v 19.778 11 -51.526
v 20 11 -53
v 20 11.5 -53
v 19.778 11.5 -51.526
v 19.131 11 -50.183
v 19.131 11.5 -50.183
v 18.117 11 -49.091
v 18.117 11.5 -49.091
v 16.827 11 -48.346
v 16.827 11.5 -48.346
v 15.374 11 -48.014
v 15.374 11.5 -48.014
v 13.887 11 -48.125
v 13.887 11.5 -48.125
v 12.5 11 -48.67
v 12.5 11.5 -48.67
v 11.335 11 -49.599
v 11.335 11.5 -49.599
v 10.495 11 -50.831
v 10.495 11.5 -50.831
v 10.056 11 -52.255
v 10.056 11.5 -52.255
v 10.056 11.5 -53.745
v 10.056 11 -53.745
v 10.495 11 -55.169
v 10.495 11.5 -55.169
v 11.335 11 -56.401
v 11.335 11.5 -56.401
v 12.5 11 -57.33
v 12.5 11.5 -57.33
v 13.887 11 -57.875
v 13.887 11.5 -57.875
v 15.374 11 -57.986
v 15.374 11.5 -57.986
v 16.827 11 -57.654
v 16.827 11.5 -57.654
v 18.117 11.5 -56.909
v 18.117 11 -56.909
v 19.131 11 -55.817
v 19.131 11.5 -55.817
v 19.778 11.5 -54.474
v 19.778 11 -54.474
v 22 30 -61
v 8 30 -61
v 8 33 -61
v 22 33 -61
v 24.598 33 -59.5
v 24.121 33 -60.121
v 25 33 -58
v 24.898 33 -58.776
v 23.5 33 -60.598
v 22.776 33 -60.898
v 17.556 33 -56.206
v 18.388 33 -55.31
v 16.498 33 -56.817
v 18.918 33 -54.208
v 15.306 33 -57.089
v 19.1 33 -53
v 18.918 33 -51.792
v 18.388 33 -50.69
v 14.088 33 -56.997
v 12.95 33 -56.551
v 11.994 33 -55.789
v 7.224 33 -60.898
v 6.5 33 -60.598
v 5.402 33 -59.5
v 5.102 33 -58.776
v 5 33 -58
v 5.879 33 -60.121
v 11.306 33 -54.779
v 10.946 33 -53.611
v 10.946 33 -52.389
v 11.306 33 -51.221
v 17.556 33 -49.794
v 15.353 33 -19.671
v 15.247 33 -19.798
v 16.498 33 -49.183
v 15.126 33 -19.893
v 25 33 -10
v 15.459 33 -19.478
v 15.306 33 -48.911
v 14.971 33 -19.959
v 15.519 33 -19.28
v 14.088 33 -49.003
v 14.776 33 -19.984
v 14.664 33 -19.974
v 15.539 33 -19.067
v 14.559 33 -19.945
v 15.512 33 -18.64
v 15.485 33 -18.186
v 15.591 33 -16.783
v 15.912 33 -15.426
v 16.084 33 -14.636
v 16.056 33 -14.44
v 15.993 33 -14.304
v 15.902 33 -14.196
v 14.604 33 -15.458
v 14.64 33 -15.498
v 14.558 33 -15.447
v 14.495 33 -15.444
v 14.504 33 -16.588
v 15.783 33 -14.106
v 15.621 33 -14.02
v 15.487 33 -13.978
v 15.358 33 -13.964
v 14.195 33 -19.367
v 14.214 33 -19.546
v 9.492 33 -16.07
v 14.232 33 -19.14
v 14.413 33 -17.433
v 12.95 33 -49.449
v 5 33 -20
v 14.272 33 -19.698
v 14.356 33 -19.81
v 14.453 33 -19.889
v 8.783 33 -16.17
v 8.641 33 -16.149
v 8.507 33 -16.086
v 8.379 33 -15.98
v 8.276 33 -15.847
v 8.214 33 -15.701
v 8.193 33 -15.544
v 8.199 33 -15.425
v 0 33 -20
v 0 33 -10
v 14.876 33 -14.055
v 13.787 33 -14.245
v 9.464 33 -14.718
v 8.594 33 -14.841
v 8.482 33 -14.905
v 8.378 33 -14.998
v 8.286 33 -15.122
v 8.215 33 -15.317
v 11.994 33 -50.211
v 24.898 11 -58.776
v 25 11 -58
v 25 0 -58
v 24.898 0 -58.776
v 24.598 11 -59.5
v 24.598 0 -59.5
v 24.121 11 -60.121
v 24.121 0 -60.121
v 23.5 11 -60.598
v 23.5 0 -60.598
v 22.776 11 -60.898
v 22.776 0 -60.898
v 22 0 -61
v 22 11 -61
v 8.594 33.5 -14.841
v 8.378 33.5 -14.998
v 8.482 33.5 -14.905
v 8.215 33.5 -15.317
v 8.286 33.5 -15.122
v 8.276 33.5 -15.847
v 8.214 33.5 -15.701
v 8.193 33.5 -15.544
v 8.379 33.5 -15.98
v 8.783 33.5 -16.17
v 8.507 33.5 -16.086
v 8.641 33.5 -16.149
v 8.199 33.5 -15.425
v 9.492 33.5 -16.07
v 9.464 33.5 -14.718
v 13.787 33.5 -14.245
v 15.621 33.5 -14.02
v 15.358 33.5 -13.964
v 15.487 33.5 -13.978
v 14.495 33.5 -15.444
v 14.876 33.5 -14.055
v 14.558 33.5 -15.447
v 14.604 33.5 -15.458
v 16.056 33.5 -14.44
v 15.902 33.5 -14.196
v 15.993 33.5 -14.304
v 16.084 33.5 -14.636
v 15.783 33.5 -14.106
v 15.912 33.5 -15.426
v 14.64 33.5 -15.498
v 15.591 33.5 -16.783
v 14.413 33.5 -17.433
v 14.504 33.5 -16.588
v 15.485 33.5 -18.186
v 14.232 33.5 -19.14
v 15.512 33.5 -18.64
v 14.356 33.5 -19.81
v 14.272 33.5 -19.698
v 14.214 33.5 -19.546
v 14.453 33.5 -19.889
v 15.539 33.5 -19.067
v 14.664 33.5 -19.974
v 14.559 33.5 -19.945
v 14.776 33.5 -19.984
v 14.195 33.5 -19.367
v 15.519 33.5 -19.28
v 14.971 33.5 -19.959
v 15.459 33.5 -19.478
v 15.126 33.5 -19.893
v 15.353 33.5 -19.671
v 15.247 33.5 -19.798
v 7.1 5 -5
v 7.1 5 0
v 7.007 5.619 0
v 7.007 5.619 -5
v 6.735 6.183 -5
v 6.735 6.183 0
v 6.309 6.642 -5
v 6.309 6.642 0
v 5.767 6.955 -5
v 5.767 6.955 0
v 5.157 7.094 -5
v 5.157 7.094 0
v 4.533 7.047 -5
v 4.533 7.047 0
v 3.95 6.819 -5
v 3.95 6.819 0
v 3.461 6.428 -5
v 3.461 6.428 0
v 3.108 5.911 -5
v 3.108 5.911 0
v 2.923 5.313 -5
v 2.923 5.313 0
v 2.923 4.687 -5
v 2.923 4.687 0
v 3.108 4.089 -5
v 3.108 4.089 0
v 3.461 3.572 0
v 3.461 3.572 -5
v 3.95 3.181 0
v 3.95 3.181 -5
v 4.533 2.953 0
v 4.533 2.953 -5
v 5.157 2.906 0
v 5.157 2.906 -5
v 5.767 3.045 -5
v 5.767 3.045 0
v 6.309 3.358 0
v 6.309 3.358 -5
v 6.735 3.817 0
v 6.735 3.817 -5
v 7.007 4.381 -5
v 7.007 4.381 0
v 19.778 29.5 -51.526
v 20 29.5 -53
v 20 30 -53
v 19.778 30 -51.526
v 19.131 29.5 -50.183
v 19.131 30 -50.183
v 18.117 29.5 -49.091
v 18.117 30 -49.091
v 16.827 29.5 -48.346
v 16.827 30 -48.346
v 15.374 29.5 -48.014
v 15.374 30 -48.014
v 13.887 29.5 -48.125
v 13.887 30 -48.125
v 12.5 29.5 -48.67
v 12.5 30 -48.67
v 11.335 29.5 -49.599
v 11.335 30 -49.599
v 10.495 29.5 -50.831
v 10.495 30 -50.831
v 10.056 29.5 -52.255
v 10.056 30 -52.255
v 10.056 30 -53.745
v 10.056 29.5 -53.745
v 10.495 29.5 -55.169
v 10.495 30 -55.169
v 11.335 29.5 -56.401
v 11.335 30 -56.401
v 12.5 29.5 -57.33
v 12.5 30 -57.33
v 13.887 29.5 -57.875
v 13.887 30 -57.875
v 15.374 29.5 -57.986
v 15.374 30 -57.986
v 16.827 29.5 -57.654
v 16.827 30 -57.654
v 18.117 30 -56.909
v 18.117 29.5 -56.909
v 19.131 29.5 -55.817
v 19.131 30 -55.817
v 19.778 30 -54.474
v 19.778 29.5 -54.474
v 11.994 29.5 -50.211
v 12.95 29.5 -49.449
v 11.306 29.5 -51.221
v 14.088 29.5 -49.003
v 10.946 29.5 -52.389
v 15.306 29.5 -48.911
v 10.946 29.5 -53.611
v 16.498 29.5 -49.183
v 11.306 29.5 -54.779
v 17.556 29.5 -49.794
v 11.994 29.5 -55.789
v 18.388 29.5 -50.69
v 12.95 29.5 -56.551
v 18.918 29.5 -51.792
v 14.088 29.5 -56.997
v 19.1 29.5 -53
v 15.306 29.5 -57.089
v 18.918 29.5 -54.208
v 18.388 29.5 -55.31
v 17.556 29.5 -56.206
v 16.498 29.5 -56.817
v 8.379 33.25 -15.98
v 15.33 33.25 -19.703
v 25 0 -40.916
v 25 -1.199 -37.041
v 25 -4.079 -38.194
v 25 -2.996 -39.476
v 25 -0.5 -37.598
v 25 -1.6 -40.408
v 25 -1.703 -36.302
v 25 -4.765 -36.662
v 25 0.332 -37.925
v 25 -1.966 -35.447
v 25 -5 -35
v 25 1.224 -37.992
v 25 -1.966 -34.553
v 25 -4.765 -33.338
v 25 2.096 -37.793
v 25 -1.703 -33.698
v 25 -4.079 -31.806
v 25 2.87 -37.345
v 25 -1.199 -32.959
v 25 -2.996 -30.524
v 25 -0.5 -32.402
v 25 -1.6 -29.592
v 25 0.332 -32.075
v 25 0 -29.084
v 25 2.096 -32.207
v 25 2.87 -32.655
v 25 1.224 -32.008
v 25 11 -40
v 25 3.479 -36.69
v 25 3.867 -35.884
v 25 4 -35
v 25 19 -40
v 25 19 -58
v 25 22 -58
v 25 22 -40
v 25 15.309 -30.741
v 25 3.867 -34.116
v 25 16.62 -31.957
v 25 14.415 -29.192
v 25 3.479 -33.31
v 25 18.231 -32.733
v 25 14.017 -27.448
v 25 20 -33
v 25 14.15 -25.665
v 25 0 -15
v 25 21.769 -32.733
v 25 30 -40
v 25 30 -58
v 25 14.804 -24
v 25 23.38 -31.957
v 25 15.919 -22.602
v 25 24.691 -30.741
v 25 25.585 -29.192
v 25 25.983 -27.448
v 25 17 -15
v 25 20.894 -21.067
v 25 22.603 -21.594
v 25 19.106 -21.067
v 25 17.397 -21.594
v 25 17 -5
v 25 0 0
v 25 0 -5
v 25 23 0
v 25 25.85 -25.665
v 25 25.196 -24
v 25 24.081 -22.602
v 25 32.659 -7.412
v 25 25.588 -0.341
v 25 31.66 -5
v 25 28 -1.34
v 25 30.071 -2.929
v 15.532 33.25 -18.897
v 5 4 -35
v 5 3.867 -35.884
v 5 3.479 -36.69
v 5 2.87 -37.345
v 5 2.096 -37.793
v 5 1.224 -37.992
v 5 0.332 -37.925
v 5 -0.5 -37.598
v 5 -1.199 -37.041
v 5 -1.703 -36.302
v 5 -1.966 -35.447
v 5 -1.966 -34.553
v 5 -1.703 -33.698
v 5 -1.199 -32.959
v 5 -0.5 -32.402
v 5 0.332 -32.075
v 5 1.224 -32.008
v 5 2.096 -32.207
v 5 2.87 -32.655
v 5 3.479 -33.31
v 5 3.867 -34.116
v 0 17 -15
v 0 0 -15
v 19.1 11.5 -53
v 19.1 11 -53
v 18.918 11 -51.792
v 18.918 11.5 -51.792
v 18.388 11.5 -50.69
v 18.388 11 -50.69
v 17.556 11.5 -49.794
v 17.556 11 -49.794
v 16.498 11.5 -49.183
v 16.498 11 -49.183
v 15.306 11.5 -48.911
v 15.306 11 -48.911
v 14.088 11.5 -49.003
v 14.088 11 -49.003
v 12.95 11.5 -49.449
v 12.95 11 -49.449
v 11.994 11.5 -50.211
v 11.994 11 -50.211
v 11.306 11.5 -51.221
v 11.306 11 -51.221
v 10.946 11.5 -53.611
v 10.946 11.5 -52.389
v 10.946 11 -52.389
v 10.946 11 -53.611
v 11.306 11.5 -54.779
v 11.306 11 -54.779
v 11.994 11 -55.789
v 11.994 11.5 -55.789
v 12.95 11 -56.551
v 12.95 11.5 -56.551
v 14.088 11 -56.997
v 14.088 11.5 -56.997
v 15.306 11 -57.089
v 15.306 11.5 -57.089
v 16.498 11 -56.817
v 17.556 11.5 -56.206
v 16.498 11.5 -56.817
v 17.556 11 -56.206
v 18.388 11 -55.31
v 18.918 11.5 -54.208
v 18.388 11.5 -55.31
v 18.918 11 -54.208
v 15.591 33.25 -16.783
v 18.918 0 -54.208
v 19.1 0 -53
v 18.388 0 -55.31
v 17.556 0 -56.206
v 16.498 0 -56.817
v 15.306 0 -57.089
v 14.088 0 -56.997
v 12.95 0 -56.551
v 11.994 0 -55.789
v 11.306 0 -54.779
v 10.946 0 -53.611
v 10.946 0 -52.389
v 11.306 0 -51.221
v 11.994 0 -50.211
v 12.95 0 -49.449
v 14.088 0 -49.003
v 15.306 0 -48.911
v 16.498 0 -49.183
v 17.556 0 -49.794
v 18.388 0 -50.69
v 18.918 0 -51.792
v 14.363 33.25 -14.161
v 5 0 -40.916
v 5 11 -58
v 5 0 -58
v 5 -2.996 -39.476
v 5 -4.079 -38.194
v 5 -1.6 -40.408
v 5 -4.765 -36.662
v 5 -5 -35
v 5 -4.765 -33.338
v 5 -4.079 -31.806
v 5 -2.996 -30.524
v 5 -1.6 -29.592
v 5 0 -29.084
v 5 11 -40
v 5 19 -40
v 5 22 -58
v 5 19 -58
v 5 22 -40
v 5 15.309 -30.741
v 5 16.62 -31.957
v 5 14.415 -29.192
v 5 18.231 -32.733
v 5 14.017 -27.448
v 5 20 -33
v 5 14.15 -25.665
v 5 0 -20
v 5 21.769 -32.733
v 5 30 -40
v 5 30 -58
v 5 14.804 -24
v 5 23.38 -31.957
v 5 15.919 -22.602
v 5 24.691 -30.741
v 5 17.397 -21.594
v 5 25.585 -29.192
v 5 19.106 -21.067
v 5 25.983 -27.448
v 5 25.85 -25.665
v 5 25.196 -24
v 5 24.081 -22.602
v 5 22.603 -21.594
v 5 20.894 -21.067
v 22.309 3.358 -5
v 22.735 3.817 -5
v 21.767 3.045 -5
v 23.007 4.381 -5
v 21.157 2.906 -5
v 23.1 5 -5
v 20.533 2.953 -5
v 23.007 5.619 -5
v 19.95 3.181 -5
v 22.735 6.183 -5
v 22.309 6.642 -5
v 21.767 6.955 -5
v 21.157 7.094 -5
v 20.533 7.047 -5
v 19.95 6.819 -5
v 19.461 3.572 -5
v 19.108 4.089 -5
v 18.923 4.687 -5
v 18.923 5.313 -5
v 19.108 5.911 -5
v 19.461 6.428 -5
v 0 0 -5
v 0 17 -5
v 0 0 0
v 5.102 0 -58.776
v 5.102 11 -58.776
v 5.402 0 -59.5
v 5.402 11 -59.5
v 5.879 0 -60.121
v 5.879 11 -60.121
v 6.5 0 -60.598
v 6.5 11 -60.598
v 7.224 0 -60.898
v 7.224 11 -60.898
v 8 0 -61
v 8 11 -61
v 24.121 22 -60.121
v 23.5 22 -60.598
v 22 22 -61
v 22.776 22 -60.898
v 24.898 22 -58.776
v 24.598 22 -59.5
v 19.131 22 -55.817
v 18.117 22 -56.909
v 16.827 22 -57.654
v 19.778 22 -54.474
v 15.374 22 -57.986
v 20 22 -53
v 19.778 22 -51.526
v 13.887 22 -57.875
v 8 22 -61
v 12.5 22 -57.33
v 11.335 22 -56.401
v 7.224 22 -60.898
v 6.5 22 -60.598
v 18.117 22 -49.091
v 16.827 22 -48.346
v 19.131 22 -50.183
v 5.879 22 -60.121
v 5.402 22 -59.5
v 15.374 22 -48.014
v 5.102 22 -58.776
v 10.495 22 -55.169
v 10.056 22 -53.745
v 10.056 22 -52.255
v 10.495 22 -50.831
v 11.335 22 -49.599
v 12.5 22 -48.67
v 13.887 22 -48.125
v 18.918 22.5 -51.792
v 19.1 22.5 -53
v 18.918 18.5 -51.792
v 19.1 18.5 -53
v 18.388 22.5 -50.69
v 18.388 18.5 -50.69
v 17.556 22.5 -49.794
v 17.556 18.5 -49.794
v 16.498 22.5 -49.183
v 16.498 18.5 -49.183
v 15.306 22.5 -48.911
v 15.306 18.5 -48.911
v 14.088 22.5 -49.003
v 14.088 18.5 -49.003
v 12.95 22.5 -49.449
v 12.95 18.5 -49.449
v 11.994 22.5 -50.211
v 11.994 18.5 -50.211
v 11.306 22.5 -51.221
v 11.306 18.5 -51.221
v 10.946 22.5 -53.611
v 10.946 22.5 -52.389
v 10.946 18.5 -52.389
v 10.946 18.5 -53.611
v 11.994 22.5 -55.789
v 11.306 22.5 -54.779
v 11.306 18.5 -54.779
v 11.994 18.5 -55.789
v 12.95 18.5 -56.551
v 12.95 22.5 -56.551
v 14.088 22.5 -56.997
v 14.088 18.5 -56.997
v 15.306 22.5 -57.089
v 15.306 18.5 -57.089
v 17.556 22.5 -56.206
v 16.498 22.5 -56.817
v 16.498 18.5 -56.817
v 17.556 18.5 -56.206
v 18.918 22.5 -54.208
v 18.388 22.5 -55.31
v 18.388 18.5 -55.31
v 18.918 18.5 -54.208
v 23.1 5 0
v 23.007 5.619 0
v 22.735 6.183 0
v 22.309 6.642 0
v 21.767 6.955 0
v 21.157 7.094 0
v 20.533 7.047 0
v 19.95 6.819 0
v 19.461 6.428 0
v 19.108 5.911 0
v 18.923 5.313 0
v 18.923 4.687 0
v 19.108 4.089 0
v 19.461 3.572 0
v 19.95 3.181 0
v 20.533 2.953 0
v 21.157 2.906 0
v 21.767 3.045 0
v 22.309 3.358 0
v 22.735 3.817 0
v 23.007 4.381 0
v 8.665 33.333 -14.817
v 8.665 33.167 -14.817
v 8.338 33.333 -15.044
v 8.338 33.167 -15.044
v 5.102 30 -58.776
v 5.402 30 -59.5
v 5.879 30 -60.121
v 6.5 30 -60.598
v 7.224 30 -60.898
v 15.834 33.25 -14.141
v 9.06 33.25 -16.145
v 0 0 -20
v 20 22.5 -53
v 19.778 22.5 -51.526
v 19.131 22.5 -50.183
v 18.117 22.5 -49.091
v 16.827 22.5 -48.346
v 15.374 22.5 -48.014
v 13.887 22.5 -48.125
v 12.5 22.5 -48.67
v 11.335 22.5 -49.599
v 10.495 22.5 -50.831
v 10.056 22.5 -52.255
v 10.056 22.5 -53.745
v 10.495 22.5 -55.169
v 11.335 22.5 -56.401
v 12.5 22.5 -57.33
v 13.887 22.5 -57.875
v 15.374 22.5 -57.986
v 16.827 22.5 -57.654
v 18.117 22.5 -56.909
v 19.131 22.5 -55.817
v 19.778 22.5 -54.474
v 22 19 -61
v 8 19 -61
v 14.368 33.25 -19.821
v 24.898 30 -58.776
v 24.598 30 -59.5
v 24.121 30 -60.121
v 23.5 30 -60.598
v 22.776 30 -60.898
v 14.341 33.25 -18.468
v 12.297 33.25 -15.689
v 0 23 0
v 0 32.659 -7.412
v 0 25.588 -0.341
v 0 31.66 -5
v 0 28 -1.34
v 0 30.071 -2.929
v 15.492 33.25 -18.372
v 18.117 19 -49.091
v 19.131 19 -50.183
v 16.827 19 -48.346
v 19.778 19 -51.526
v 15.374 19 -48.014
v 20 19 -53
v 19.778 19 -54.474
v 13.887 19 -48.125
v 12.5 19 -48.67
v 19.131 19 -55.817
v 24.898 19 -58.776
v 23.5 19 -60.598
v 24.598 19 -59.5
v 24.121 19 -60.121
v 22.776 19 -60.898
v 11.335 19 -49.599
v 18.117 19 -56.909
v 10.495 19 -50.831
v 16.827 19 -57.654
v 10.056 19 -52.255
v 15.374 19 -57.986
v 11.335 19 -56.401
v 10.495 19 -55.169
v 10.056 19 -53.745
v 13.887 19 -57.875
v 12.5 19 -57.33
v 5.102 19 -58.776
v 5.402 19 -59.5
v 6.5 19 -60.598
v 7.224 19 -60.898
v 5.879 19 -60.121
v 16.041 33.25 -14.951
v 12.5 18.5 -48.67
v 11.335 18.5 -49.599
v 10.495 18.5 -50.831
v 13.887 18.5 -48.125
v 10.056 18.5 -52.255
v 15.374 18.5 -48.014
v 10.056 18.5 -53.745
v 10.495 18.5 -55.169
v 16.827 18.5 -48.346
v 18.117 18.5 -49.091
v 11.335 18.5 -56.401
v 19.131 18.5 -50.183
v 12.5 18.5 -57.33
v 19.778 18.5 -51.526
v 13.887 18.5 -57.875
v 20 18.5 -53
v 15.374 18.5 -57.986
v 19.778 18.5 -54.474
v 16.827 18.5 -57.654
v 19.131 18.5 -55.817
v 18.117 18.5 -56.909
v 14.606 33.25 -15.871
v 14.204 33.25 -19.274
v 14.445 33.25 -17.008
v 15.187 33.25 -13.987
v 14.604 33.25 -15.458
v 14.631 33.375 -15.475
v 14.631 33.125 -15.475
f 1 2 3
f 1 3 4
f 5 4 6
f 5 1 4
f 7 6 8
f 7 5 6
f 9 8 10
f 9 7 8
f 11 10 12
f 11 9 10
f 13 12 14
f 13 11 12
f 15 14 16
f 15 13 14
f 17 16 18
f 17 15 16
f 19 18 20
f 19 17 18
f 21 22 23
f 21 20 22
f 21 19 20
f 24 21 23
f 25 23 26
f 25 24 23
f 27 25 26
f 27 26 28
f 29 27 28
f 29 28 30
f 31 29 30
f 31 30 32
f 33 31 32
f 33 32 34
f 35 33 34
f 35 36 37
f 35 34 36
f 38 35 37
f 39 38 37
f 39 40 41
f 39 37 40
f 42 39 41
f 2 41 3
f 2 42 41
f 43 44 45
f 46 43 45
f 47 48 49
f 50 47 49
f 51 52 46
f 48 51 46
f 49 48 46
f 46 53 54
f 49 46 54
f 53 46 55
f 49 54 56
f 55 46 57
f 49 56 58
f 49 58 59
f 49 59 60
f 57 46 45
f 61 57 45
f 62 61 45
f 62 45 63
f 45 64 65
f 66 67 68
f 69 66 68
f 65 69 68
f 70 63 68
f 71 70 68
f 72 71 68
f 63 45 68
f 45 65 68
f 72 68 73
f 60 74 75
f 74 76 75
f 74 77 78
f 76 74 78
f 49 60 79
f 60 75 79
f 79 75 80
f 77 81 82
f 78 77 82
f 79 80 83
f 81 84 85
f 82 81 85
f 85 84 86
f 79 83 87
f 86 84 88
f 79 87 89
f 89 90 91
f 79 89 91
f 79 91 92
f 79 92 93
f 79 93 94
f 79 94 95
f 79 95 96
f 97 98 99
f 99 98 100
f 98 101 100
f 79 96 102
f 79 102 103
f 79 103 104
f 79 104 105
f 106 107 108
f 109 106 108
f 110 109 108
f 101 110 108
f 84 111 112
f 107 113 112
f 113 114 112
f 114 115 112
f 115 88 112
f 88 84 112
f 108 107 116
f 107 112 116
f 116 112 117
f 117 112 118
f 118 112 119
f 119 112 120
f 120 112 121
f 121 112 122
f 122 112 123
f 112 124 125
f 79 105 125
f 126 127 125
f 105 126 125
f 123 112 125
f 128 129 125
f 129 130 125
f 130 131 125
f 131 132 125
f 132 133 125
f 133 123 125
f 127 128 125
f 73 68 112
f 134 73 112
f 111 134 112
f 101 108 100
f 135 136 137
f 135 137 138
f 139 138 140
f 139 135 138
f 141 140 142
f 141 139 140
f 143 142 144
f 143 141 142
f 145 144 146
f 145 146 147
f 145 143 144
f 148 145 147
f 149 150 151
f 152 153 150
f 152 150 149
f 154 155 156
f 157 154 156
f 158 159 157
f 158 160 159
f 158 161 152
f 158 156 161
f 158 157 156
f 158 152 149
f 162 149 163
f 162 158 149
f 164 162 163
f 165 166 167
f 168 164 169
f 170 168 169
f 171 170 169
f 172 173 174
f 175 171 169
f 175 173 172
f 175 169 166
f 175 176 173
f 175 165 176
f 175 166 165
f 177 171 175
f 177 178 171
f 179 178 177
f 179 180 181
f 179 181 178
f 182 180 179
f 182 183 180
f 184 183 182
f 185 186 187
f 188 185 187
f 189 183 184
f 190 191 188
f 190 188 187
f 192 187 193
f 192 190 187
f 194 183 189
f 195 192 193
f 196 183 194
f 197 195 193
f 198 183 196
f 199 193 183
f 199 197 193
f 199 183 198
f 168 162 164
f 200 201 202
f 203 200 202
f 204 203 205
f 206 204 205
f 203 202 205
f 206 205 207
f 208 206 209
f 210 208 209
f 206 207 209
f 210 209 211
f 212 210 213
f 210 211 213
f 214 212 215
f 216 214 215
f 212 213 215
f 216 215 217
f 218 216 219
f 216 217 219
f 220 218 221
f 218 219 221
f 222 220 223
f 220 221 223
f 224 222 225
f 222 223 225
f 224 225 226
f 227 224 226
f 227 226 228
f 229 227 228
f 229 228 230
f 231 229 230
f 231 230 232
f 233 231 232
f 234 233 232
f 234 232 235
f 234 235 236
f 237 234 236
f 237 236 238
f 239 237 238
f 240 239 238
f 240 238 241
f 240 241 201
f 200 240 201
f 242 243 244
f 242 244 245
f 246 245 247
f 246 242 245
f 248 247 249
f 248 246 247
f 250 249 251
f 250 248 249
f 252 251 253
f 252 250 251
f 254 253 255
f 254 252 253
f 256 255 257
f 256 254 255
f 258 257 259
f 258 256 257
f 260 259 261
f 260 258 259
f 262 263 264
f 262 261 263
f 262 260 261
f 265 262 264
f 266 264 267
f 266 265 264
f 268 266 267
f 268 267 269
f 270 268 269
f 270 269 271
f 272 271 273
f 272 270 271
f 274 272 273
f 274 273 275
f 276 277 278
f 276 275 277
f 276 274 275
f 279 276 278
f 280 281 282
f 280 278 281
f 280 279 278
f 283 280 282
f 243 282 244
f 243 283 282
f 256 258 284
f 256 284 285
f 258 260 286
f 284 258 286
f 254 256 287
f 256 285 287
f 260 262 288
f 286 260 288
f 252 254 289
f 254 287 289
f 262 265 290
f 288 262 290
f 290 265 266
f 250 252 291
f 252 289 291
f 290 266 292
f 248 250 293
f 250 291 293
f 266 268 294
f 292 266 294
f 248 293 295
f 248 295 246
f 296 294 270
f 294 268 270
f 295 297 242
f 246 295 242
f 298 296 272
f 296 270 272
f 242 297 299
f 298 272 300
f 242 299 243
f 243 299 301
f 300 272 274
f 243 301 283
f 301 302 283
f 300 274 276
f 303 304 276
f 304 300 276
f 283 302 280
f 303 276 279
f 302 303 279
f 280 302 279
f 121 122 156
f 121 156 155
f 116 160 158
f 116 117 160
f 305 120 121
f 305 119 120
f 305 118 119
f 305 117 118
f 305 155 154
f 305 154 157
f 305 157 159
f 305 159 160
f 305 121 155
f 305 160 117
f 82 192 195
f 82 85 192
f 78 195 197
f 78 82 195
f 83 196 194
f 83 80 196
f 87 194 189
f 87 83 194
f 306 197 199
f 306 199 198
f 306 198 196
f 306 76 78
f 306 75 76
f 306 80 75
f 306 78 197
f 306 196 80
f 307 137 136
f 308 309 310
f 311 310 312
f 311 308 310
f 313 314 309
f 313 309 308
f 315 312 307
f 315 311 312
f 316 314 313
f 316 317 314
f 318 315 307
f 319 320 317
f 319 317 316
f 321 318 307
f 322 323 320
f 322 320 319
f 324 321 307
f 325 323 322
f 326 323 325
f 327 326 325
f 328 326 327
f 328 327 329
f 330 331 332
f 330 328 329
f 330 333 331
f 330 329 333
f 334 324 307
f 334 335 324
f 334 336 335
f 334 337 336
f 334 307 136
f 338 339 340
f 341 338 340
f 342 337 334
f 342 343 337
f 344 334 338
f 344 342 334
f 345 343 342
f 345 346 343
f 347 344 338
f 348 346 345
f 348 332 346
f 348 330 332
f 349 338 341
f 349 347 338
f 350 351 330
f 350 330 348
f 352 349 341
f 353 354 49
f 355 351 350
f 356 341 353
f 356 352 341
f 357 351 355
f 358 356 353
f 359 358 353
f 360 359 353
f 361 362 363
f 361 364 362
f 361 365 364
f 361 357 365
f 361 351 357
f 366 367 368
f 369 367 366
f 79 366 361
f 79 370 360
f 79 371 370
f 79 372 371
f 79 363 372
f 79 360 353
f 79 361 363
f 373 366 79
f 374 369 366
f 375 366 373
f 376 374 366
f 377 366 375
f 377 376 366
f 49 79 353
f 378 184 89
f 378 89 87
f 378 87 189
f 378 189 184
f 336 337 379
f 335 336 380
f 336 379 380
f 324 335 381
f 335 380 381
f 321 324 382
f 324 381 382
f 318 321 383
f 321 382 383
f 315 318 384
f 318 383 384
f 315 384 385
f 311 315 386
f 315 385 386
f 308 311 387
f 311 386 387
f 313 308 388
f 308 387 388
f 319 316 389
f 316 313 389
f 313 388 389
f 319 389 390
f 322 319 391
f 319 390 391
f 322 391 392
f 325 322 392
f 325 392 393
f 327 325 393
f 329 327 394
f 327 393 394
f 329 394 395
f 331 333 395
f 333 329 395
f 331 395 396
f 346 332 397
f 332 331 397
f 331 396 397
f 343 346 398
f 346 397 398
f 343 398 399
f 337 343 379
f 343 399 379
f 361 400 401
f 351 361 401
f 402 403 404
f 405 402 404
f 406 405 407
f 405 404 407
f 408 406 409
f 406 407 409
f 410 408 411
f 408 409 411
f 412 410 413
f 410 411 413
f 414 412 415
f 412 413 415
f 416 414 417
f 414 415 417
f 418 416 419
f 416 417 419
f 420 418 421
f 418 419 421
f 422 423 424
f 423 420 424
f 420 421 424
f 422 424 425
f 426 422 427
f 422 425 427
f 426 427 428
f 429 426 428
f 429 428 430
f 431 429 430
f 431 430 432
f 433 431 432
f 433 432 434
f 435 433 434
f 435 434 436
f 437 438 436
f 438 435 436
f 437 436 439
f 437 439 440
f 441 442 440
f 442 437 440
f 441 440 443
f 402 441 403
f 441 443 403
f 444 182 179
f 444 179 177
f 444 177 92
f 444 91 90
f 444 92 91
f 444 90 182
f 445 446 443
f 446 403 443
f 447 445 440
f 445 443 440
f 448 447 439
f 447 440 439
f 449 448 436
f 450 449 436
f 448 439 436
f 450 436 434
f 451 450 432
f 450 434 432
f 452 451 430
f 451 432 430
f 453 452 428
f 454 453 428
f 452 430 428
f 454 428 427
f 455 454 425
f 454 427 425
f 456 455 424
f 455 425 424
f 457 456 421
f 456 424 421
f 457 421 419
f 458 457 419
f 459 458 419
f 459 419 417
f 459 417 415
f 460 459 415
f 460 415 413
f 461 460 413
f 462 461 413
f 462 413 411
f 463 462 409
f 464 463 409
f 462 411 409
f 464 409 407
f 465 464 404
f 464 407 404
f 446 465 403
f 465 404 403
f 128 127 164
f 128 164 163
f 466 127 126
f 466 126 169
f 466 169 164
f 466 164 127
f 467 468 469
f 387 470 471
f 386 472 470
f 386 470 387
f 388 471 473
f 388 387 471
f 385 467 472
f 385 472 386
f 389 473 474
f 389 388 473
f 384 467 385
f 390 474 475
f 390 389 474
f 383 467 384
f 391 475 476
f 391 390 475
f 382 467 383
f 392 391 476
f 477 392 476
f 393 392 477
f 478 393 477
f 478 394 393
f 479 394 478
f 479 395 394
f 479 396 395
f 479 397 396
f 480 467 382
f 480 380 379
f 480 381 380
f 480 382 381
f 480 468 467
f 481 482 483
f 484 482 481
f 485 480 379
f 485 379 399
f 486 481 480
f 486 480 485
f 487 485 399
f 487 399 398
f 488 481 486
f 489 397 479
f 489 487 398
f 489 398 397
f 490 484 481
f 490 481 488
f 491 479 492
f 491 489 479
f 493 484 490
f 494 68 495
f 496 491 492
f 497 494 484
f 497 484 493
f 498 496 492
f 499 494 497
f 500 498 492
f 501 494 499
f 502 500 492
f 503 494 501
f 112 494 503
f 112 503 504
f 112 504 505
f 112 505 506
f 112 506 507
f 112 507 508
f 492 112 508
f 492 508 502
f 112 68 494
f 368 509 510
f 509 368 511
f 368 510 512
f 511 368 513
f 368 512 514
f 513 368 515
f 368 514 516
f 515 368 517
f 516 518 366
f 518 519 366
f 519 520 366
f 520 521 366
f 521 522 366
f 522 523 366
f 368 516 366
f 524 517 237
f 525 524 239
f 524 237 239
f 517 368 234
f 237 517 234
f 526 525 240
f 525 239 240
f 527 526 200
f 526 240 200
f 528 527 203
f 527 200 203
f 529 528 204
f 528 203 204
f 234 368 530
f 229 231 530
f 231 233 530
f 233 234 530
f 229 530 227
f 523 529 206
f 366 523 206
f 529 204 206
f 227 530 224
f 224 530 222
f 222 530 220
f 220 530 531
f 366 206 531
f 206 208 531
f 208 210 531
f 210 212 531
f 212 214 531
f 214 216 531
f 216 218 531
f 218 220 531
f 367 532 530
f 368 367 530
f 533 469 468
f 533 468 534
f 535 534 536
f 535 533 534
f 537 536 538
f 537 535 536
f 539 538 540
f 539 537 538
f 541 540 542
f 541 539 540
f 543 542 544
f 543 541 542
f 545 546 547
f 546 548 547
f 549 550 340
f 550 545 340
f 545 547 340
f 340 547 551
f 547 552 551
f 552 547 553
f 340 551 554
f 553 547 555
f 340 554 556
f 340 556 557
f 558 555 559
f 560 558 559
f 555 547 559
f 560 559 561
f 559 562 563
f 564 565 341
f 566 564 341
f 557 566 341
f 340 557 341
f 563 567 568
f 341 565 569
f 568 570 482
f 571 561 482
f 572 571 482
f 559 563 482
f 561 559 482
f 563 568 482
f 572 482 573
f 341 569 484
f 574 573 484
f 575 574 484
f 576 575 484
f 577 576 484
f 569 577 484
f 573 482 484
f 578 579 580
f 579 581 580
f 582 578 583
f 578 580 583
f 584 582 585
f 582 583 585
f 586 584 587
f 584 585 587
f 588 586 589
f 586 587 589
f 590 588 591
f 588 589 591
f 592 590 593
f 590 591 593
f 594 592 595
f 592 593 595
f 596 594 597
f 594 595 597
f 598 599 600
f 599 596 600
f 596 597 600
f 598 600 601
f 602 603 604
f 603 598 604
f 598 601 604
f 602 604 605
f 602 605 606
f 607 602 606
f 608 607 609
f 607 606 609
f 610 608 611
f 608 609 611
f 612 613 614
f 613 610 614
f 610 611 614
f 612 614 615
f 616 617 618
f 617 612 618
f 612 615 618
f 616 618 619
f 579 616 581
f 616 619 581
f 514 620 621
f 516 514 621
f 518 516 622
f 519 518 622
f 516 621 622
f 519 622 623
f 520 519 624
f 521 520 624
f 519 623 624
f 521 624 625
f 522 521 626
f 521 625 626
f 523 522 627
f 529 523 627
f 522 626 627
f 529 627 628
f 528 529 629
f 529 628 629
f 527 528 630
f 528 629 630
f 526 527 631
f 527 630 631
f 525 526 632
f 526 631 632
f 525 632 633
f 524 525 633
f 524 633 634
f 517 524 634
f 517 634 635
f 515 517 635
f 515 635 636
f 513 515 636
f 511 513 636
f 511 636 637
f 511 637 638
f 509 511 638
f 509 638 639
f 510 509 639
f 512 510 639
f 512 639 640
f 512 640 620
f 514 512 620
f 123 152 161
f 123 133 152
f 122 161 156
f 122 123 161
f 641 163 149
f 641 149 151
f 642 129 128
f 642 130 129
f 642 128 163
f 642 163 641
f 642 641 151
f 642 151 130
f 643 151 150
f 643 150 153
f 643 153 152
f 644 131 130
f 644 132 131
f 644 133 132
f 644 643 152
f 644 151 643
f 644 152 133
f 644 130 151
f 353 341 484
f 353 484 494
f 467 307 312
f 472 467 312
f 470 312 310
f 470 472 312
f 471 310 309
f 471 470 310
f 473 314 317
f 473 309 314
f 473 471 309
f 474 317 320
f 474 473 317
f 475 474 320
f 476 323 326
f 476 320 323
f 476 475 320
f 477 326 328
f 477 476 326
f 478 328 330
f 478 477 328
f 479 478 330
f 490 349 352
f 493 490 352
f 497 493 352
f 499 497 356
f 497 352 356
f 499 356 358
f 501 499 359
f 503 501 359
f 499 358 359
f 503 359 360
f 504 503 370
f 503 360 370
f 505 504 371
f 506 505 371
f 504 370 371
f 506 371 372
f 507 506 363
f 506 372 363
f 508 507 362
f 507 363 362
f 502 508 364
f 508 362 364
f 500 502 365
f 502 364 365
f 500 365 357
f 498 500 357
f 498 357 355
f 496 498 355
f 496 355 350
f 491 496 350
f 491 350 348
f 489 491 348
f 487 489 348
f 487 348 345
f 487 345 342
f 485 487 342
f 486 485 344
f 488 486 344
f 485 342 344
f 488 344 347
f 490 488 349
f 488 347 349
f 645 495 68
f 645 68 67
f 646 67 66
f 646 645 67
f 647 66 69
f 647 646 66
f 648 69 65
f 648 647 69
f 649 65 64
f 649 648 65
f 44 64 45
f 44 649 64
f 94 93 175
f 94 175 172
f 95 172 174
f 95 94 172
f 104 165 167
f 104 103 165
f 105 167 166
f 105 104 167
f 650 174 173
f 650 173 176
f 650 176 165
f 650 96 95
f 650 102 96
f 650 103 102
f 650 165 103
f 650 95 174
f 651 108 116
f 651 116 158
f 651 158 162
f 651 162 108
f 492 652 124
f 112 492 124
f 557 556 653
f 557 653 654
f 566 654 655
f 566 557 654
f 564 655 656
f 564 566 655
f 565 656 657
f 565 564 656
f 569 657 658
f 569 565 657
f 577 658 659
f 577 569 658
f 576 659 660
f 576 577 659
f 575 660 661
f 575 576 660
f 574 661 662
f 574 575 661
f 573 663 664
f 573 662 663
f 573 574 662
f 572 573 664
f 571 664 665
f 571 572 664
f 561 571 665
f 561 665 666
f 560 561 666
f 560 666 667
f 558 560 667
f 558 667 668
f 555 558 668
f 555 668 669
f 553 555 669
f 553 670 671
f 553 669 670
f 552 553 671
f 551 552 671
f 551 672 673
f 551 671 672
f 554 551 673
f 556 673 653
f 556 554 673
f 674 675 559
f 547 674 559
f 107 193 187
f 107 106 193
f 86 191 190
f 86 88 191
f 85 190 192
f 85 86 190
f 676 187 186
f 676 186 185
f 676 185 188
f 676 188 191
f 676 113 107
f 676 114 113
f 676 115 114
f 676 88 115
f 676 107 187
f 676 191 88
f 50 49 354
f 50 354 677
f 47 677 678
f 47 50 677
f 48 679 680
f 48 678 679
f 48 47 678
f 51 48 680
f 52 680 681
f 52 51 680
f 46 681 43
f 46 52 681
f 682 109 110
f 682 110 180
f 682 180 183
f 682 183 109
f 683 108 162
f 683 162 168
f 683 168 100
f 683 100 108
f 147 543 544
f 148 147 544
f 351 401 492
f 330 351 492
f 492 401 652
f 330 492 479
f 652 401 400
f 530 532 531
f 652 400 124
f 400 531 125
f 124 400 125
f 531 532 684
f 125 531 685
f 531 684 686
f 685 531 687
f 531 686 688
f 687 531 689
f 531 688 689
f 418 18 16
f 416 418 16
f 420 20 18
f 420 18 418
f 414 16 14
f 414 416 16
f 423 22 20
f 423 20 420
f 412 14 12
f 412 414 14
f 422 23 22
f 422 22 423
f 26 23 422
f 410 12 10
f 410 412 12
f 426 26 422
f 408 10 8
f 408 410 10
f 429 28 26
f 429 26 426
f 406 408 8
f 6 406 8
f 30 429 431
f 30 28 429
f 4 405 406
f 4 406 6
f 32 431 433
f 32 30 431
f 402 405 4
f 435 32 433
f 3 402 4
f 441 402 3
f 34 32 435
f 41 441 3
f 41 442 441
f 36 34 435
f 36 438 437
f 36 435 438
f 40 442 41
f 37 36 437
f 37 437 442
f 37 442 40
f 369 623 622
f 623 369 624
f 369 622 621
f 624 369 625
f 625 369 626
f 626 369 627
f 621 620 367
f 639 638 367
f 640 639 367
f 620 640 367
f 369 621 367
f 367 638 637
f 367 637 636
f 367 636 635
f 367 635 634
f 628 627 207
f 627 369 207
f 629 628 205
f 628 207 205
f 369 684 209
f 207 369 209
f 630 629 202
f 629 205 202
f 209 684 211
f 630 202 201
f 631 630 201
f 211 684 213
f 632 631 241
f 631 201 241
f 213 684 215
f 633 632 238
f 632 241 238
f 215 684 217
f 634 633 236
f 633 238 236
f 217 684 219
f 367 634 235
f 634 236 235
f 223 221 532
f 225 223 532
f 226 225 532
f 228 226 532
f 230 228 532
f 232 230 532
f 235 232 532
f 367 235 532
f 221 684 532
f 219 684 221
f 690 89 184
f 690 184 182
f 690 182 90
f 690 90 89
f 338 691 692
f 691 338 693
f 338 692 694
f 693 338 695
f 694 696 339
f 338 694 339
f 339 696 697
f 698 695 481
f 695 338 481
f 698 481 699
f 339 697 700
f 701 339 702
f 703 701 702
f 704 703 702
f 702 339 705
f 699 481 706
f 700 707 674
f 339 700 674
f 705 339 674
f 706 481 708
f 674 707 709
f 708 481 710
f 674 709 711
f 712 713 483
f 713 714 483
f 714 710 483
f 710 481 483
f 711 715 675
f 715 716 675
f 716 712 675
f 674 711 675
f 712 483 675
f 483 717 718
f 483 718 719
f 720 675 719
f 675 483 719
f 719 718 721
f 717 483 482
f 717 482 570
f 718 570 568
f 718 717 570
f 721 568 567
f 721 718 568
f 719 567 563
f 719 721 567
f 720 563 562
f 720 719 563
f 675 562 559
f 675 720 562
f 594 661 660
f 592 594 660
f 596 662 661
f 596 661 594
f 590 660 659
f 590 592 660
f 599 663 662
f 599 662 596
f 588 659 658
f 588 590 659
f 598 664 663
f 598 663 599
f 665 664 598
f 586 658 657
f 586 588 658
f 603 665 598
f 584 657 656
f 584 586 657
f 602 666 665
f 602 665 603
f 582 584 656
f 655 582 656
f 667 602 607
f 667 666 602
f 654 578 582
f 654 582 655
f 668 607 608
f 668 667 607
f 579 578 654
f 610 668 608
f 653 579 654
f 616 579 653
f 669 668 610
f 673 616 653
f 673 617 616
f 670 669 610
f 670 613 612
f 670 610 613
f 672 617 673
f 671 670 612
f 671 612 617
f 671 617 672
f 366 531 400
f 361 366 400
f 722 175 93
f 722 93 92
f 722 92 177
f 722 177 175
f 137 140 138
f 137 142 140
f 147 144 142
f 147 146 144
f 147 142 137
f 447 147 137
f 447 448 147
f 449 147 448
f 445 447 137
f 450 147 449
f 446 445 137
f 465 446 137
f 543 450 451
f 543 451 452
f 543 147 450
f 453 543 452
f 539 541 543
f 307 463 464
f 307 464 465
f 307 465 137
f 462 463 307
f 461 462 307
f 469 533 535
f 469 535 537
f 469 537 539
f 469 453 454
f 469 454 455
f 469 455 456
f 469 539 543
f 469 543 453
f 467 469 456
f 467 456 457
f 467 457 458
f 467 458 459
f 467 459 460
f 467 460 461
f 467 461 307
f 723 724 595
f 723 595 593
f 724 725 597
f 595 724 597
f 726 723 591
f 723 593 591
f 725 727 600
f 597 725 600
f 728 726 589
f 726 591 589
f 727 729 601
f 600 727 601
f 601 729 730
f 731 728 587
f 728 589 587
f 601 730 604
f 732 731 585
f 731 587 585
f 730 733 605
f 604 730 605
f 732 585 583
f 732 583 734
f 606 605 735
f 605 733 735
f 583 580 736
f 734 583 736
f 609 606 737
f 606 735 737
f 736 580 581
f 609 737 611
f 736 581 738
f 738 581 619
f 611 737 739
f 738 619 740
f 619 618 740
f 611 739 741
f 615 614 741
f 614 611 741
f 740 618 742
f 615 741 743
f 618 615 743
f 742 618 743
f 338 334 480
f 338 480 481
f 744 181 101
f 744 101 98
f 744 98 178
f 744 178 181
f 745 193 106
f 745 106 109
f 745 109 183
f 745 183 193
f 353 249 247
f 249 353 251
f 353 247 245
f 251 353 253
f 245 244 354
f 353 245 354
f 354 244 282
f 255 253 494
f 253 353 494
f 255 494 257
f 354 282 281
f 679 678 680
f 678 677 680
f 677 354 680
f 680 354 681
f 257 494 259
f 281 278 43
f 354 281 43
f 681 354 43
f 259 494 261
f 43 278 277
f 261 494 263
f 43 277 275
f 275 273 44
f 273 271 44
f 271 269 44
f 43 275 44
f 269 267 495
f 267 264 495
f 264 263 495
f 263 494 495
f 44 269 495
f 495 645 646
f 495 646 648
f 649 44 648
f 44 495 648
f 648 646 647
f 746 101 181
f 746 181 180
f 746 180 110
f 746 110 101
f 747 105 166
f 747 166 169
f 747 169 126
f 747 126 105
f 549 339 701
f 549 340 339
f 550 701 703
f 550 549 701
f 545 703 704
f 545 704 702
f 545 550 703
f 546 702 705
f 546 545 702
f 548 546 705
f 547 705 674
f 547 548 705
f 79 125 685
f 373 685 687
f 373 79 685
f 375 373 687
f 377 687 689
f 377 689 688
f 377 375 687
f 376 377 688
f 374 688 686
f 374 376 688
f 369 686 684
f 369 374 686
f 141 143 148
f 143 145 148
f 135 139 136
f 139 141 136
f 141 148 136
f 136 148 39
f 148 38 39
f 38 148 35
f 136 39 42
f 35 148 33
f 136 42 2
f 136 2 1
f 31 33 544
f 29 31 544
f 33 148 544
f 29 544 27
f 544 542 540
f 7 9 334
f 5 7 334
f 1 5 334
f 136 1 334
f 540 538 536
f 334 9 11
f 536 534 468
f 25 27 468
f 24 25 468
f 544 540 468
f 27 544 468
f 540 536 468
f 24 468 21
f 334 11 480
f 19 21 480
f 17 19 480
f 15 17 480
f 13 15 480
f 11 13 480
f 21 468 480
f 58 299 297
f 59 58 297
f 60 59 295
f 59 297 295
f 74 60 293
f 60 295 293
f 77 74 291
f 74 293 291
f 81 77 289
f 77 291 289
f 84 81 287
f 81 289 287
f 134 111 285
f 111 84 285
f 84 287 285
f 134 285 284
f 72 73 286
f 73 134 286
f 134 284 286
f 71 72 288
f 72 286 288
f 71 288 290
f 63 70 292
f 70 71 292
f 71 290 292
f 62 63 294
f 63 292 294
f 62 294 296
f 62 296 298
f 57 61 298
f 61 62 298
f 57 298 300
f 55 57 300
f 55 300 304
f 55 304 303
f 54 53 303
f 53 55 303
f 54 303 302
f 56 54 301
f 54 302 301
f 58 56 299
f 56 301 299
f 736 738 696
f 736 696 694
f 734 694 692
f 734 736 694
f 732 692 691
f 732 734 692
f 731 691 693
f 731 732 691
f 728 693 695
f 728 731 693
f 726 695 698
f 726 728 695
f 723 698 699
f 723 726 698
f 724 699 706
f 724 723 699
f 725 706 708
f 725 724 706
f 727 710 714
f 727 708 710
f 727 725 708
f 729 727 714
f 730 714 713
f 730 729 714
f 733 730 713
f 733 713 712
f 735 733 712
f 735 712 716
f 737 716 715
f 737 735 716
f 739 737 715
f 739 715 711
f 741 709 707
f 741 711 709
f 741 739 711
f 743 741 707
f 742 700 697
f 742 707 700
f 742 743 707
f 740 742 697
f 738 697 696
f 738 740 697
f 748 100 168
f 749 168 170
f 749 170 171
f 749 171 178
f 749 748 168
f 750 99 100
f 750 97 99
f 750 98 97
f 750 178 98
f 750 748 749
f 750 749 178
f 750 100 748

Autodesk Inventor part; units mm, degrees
ref_plane "YZ Plane" through (0, 0, 0) normal (1, 0, 0) x (0, 1, 0)
ref_plane "XZ Plane" through (0, 0, 0) normal (0, 1, 0) x (-1, 0, 0)
ref_plane "XY Plane" through (0, 0, 0) normal (0, 0, 1) x (1, 0, 0)
sketch "Sketch1" plane through (0, 0, 0) normal (1, 0, 0) x (0, 1, 0)
  line L0 (0, 0) -> (0, -5)
  line L1 (0, -5) -> (17, -5)
  line L2 (17, -5) -> (17, -15)
  line L3 (17, -15) -> (0, -15)
  line L4 (0, -61) -> (33, -61)
  line L5 (33, -61) -> (33, 0)
  line L6 (33, 0) -> (0, 0)
  circle A0 centre (1, -35) radius 3
  arc A1 (0, -29.0839) -> (0, -40.9161) centre (1, -35) ccw
  line L7 (0, -15) -> (0, -29.0839)
  line L8 (0, -61) -> (0, -40.9161)
  dimension "d0" = 5
  dimension "d1" = 17
  dimension "d2" = 10
  dimension "d4" = 33
  dimension "d6" = 6
  dimension "d7" = 1
  dimension "d8" = 20
  dimension "d9" = 6
  dimension "d47" = 46
extrude "Extrusion1" add sketch "Sketch1" along normal blind 25
sketch "Sketch2" plane through (0, 0, 0) normal (-1, 0, 0) x (0, 0, 1)
  line L0 (-70, -8) -> (-20, -8)
  line L1 (-20, -8) -> (-20, 42)
  line L2 (-20, 42) -> (-70, 42)
  line L3 (-70, 42) -> (-70, -8)
  point P0 (0, 0)
  dimension "d12" = 20
  dimension "d13" = 8
  dimension "d14" = 50
  dimension "d15" = 50
extrude "Extrusion2" cut sketch "Sketch2" against normal blind 5
sketch "Sketch3" plane through (5, 0, 0) normal (-1, 0, 0) x (0, 0, 1)
  line L0 (-61, 22) -> (-40, 22)
  line L1 (-40, 22) -> (-40, 30)
  line L2 (-40, 30) -> (-61, 30)
  line L3 (-61, 30) -> (-61, 22)
  line L4 (-61, 11) -> (-40, 11)
  line L5 (-40, 11) -> (-40, 19)
  line L6 (-40, 19) -> (-61, 19)
  line L7 (-61, 19) -> (-61, 11)
  line L8 (-61, 33) -> (-20, 33) projected
  point P0 (0, 0)
  dimension "d18" = 8
  dimension "d19" = 8
  dimension "d20" = 21
  dimension "d21" = 3
  dimension "d22" = 3
extrude "Extrusion3" cut sketch "Sketch3" against normal up to next
sketch "Sketch4" plane through (0, 33, 0) normal (0, 1, 0) x (1, 0, 0)
  circle A0 centre (15, 53) radius 4.1
  line L0 (5, 61) -> (25, 61) projected
  point P0 (0, 0)
  point P1 (15, 61)
  dimension "d25" = 8.2
  dimension "d26" = 8
extrude "Extrusion4" cut sketch "Sketch4" against normal through all
sketch "Sketch5" plane through (5, 11, -40) normal (0, 1, 0) x (1, 0, 0)
  circle A0 centre (10, 13) radius 4.1 projected
  circle A1 centre (10, 13) radius 5
  point P0 (-5, -40)
  dimension "d29" = 10
extrude "Extrusion5" add sketch "Sketch5" along normal blind 0.5
pattern_linear "Rectangular Pattern1" count 2 spacing 11 along (0, 1, 0) of "Extrusion5"
pattern_linear "Rectangular Pattern2" count 2 spacing 7.5 along (0, 1, 0) of "Extrusion5", "Rectangular Pattern1"
sketch "Sketch6" plane through (25, 0, 0) normal (1, 0, 0) x (0, 0, -1)
  circle A0 centre (27, 20) radius 6
  line L0 (61, 33) -> (0, 33) projected
  line L1 (0, 33) -> (0, 0) projected
  dimension "d38" = 12
  dimension "d39" = 13
  dimension "d40" = 27
extrude "Extrusion6" cut sketch "Sketch6" against normal up to surface (20 mm away)
fillet "Fillet1" radius 3 6 edges at (25, 31.5, -61) (25, 20.5, -61) (25, 5.5, -61) (5, 31.5, -61) (5, 20.5, -61) (5, 5.5, -61)
fillet "Fillet2" radius 10 1 edges at (12.5, 33, 0)
sketch "Sketch7" plane through (0, 33, -20) normal (0, 1, 0) x (1, 0, 0)
  spline S0 degree 2 poles (15.5392, -0.9329) (15.5392, -1.06) (15.5119, -1.3597) knots 0 0 0 1 1 1
  spline S1 degree 2 poles (15.5119, -1.3597) (15.4847, -1.6684) (15.4847, -1.8137) knots 0 0 0 1 1 1
  spline S2 degree 2 poles (15.4847, -1.8137) (15.4847, -3.2393) (15.9115, -4.5742) knots 0 0 0 1 1 1
  spline S3 degree 2 poles (15.9115, -4.5742) (16.084, -5.1281) (16.084, -5.3642) knots 0 0 0 1 1 1
  spline S4 degree 2 poles (16.084, -5.3642) (16.084, -5.682) (15.5846, -6.0362) (15.3576, -6.0362) knots 0 0 0 1 2 2 2
  spline S5 degree 2 poles (15.3576, -6.0362) (15.2577, -6.0362) (14.8763, -5.9454) knots 0 0 0 1 1 1
  spline S6 degree 2 poles (14.8763, -5.9454) (14.395, -5.8273) (13.7866, -5.7547) knots 0 0 0 1 1 1
  line L0 (13.7866, -5.7547) -> (9.4643, -5.2825)
  spline S7 degree 2 poles (9.4643, -5.2825) (8.8468, -5.228) (8.4836, -5.1372) (8.193, -4.774) (8.193, -4.4561) knots 0 0 0 1 2 3 3 3
  spline S8 degree 2 poles (8.193, -4.4561) (8.193, -4.211) (8.5653, -3.8296) (8.7832, -3.8296) knots 0 0 0 1 2 2 2
  spline S9 degree 2 poles (8.7832, -3.8296) (8.983, -3.8296) (9.4915, -3.9295) knots 0 0 0 1 1 1
  spline S10 degree 2 poles (9.4915, -3.9295) (10.227, -4.0657) (14.3678, -4.556) (14.4949, -4.556) knots 0 0 0 1 2 2 2
  spline S11 degree 2 poles (14.4949, -4.556) (14.6402, -4.556) (14.6402, -4.5015) knots 0 0 0 1 1 1
  spline S12 degree 2 poles (14.6402, -4.5015) (14.6402, -4.3018) (14.504, -3.4119) knots 0 0 0 1 1 1
  spline S13 degree 2 poles (14.504, -3.4119) (14.4313, -2.9942) (14.4132, -2.5674) knots 0 0 0 1 1 1
  spline S14 degree 2 poles (14.4132, -2.5674) (14.3587, -1.3506) (14.2316, -0.8602) knots 0 0 0 1 1 1
  spline S15 degree 2 poles (14.2316, -0.8602) (14.1952, -0.7059) (14.1952, -0.6332) knots 0 0 0 1 1 1
  spline S16 degree 2 poles (14.1952, -0.6332) (14.1952, -0.3426) (14.5403, -0.0157) (14.7764, -0.0157) knots 0 0 0 1 2 2 2
  spline S17 degree 2 poles (14.7764, -0.0157) (15.1215, -0.0157) (15.5392, -0.5787) (15.5392, -0.9329) knots 0 0 0 1 2 2 2
  point P0 (0, -20)
  point P1 (8.193, -6.6991)
extrude "Extrusion7" add sketch "Sketch7" along normal blind 0.5
sketch "Sketch8" plane through (0, 0, 0) normal (0, 0, 1) x (1, 0, 0)
  circle A0 centre (5, 5) radius 2.1
  circle A1 centre (21, 5) radius 2.1
  line L0 (0, 0) -> (25, 0) projected
  line L1 (25, 23) -> (25, 0) projected
  line L2 (0, 23) -> (0, 0) projected
  dimension "d48" = 4.2
  dimension "d49" = 5
  dimension "d50" = 4
  dimension "d51" = 5
extrude "Extrusion8" cut sketch "Sketch8" against normal up to next
equation "\"d18\" = d19"
equation "\"d21\" = d22"
properties material "ABS Plastic"
